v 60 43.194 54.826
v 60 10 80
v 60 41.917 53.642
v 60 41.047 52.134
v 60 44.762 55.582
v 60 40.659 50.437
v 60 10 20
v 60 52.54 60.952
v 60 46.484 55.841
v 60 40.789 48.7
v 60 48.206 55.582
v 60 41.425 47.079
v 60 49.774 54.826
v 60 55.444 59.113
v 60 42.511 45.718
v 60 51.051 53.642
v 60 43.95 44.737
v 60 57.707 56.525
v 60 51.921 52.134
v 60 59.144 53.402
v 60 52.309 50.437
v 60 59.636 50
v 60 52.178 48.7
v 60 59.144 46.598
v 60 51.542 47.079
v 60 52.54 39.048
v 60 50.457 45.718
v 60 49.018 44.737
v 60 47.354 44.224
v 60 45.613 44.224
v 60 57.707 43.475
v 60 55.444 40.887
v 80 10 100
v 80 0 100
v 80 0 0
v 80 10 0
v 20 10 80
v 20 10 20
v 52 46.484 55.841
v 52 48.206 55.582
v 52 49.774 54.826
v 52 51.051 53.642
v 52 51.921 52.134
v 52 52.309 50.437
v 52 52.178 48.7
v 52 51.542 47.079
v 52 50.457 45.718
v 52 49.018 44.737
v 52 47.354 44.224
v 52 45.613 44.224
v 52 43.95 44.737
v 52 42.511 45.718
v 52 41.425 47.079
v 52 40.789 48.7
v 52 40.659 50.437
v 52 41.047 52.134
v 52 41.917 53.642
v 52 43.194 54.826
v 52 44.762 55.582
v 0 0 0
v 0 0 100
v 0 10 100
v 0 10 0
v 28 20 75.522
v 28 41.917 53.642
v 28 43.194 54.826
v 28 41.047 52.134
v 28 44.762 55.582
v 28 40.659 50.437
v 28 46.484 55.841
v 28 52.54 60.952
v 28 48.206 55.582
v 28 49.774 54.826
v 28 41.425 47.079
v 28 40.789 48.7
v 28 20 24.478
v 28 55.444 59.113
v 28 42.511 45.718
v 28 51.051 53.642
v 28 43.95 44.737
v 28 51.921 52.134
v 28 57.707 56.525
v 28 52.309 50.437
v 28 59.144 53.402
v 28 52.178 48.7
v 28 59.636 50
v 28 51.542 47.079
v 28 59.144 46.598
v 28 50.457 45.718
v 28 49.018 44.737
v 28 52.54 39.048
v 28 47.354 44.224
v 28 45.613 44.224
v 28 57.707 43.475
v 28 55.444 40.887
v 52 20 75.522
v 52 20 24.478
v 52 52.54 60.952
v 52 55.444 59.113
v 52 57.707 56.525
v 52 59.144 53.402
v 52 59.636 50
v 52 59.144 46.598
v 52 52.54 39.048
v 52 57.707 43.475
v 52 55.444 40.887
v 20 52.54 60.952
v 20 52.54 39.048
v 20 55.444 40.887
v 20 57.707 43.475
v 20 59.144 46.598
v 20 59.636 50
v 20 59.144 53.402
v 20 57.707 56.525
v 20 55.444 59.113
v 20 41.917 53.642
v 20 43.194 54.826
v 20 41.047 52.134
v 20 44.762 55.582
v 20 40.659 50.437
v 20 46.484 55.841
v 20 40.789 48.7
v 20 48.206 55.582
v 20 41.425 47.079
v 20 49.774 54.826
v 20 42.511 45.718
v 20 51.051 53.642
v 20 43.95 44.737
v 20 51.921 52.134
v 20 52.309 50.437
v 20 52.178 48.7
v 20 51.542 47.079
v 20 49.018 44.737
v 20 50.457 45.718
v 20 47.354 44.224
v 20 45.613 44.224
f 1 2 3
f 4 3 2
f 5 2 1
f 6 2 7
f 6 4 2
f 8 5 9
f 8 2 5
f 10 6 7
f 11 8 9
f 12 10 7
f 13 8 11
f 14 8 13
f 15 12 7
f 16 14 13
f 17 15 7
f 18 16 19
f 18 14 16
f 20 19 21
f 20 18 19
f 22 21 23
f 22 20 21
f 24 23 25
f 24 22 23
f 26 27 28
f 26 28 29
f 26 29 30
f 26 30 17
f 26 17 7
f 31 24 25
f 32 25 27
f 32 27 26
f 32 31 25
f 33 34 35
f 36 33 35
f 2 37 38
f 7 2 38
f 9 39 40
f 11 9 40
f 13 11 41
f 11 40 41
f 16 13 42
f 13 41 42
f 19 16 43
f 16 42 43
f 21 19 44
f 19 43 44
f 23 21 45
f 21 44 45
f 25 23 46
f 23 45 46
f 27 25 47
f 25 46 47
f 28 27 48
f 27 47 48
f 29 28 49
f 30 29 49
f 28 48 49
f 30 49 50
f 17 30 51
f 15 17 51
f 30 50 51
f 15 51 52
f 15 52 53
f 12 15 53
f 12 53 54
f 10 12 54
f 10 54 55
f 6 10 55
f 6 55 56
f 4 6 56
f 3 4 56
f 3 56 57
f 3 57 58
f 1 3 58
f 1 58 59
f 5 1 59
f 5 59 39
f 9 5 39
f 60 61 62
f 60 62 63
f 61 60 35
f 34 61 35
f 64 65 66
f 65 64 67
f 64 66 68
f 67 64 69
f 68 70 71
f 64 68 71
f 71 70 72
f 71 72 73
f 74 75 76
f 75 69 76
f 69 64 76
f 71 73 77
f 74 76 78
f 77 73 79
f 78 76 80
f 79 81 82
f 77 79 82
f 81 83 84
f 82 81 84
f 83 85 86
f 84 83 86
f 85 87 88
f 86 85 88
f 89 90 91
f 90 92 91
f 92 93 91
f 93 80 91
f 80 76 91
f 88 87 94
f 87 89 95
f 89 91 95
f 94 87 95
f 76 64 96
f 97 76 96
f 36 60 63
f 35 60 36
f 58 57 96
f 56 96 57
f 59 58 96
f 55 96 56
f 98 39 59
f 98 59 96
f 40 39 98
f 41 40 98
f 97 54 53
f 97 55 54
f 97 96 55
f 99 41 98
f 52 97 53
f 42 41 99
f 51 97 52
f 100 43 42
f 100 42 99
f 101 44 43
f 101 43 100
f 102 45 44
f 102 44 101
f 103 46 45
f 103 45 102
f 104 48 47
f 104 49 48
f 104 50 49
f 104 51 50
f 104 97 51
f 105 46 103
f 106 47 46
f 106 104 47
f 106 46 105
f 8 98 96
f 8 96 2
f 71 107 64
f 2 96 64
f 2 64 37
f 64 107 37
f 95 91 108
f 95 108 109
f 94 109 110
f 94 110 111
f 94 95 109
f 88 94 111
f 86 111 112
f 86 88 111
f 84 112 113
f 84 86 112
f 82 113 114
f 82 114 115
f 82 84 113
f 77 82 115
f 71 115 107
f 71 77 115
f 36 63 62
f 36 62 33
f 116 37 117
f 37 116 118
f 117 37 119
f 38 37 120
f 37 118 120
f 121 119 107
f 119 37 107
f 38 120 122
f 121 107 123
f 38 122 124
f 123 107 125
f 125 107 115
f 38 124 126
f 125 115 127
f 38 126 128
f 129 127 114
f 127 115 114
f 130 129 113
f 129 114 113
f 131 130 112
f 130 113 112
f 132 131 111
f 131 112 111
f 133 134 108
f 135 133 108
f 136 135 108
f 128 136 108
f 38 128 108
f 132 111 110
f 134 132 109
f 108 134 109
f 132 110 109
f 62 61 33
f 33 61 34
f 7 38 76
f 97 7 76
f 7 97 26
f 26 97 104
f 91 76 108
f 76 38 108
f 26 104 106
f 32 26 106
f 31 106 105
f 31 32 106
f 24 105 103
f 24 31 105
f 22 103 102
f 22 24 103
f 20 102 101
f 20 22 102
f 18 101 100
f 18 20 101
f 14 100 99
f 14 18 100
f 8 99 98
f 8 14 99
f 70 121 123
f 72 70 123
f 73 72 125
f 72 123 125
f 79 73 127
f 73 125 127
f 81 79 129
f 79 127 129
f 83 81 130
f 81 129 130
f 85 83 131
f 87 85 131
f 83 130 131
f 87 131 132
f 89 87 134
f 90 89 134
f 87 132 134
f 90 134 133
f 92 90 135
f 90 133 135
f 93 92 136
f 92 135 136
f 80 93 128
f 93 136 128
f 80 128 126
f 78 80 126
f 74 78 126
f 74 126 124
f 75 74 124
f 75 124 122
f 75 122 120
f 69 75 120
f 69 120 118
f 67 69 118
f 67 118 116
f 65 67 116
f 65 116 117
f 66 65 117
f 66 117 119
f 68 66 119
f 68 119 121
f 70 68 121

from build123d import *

# Parameters (mm, degrees)
SKETCH1_W                = 80
SKETCH1_H                = 100
BOSS_EXTRUDE1_DEPTH      = 10
BOSS_EXTRUDE2_DEPTH      = 60
BOSS_EXTRUDE2_DEPTH_BACK = 0.0001
MOVE_FACE1_BY            = 20
FILLET1_R                = 12
SKETCH8_R                = 5.841043822
CUT_EXTRUDE1_DEPTH       = 60
SKETCH10_W               = 24
SKETCH10_H               = 46.513085369
CUT_EXTRUDE2_DEPTH       = 200


with BuildPart() as part:
    # Sketch1 → Boss-Extrude1 (new body)
    with BuildSketch(Plane(origin=(0, 0, 0), x_dir=(1, 0, 0), z_dir=(0, 1, 0))):
        with Locations((40, -50)):
            Rectangle(SKETCH1_W, SKETCH1_H)
    extrude(amount=BOSS_EXTRUDE1_DEPTH)


with BuildPart() as body_2:
    # Sketch2 → Boss-Extrude2 (new, two sides: drawn at the far end of the back side and taken through both)
    with BuildSketch(Plane(origin=(0, 0, 0), x_dir=(0, 0, -1), z_dir=(1, 0, 0)).offset(-BOSS_EXTRUDE2_DEPTH_BACK)):
        Polygon((-80, 10), (-20, 10), (-50, 77), align=None)
    extrude(amount=BOSS_EXTRUDE2_DEPTH + BOSS_EXTRUDE2_DEPTH_BACK)

    # Move Face1: a face moved inward by 20.0
    extrude(body_2.faces().sort_by_distance((-0.0001, 32.333333333, 50))[0], amount=MOVE_FACE1_BY, dir=(1, 0, 0), mode=Mode.SUBTRACT)

    # Fillet1
    fillet1_edges = [body_2.edges().sort_by_distance(p)[0] for p in [
        (39.99995, 77, 50),
    ]]
    fillet(fillet1_edges, radius=FILLET1_R)

    # Sketch8 → Cut-Extrude1 (cut)
    with BuildSketch(Plane.ZY.offset(-19.9999)):
        with Locations((50, 46.483900052)):
            Circle(SKETCH8_R)
    extrude(amount=-CUT_EXTRUDE1_DEPTH, mode=Mode.SUBTRACT)

    # Sketch10 → Cut-Extrude2 (cut)
    with BuildSketch(Plane.XY):
        with Locations((40, 43.256542685)):
            Rectangle(SKETCH10_W, SKETCH10_H)
    extrude(amount=CUT_EXTRUDE2_DEPTH, mode=Mode.SUBTRACT)


solid = Compound([part.part, body_2.part])
